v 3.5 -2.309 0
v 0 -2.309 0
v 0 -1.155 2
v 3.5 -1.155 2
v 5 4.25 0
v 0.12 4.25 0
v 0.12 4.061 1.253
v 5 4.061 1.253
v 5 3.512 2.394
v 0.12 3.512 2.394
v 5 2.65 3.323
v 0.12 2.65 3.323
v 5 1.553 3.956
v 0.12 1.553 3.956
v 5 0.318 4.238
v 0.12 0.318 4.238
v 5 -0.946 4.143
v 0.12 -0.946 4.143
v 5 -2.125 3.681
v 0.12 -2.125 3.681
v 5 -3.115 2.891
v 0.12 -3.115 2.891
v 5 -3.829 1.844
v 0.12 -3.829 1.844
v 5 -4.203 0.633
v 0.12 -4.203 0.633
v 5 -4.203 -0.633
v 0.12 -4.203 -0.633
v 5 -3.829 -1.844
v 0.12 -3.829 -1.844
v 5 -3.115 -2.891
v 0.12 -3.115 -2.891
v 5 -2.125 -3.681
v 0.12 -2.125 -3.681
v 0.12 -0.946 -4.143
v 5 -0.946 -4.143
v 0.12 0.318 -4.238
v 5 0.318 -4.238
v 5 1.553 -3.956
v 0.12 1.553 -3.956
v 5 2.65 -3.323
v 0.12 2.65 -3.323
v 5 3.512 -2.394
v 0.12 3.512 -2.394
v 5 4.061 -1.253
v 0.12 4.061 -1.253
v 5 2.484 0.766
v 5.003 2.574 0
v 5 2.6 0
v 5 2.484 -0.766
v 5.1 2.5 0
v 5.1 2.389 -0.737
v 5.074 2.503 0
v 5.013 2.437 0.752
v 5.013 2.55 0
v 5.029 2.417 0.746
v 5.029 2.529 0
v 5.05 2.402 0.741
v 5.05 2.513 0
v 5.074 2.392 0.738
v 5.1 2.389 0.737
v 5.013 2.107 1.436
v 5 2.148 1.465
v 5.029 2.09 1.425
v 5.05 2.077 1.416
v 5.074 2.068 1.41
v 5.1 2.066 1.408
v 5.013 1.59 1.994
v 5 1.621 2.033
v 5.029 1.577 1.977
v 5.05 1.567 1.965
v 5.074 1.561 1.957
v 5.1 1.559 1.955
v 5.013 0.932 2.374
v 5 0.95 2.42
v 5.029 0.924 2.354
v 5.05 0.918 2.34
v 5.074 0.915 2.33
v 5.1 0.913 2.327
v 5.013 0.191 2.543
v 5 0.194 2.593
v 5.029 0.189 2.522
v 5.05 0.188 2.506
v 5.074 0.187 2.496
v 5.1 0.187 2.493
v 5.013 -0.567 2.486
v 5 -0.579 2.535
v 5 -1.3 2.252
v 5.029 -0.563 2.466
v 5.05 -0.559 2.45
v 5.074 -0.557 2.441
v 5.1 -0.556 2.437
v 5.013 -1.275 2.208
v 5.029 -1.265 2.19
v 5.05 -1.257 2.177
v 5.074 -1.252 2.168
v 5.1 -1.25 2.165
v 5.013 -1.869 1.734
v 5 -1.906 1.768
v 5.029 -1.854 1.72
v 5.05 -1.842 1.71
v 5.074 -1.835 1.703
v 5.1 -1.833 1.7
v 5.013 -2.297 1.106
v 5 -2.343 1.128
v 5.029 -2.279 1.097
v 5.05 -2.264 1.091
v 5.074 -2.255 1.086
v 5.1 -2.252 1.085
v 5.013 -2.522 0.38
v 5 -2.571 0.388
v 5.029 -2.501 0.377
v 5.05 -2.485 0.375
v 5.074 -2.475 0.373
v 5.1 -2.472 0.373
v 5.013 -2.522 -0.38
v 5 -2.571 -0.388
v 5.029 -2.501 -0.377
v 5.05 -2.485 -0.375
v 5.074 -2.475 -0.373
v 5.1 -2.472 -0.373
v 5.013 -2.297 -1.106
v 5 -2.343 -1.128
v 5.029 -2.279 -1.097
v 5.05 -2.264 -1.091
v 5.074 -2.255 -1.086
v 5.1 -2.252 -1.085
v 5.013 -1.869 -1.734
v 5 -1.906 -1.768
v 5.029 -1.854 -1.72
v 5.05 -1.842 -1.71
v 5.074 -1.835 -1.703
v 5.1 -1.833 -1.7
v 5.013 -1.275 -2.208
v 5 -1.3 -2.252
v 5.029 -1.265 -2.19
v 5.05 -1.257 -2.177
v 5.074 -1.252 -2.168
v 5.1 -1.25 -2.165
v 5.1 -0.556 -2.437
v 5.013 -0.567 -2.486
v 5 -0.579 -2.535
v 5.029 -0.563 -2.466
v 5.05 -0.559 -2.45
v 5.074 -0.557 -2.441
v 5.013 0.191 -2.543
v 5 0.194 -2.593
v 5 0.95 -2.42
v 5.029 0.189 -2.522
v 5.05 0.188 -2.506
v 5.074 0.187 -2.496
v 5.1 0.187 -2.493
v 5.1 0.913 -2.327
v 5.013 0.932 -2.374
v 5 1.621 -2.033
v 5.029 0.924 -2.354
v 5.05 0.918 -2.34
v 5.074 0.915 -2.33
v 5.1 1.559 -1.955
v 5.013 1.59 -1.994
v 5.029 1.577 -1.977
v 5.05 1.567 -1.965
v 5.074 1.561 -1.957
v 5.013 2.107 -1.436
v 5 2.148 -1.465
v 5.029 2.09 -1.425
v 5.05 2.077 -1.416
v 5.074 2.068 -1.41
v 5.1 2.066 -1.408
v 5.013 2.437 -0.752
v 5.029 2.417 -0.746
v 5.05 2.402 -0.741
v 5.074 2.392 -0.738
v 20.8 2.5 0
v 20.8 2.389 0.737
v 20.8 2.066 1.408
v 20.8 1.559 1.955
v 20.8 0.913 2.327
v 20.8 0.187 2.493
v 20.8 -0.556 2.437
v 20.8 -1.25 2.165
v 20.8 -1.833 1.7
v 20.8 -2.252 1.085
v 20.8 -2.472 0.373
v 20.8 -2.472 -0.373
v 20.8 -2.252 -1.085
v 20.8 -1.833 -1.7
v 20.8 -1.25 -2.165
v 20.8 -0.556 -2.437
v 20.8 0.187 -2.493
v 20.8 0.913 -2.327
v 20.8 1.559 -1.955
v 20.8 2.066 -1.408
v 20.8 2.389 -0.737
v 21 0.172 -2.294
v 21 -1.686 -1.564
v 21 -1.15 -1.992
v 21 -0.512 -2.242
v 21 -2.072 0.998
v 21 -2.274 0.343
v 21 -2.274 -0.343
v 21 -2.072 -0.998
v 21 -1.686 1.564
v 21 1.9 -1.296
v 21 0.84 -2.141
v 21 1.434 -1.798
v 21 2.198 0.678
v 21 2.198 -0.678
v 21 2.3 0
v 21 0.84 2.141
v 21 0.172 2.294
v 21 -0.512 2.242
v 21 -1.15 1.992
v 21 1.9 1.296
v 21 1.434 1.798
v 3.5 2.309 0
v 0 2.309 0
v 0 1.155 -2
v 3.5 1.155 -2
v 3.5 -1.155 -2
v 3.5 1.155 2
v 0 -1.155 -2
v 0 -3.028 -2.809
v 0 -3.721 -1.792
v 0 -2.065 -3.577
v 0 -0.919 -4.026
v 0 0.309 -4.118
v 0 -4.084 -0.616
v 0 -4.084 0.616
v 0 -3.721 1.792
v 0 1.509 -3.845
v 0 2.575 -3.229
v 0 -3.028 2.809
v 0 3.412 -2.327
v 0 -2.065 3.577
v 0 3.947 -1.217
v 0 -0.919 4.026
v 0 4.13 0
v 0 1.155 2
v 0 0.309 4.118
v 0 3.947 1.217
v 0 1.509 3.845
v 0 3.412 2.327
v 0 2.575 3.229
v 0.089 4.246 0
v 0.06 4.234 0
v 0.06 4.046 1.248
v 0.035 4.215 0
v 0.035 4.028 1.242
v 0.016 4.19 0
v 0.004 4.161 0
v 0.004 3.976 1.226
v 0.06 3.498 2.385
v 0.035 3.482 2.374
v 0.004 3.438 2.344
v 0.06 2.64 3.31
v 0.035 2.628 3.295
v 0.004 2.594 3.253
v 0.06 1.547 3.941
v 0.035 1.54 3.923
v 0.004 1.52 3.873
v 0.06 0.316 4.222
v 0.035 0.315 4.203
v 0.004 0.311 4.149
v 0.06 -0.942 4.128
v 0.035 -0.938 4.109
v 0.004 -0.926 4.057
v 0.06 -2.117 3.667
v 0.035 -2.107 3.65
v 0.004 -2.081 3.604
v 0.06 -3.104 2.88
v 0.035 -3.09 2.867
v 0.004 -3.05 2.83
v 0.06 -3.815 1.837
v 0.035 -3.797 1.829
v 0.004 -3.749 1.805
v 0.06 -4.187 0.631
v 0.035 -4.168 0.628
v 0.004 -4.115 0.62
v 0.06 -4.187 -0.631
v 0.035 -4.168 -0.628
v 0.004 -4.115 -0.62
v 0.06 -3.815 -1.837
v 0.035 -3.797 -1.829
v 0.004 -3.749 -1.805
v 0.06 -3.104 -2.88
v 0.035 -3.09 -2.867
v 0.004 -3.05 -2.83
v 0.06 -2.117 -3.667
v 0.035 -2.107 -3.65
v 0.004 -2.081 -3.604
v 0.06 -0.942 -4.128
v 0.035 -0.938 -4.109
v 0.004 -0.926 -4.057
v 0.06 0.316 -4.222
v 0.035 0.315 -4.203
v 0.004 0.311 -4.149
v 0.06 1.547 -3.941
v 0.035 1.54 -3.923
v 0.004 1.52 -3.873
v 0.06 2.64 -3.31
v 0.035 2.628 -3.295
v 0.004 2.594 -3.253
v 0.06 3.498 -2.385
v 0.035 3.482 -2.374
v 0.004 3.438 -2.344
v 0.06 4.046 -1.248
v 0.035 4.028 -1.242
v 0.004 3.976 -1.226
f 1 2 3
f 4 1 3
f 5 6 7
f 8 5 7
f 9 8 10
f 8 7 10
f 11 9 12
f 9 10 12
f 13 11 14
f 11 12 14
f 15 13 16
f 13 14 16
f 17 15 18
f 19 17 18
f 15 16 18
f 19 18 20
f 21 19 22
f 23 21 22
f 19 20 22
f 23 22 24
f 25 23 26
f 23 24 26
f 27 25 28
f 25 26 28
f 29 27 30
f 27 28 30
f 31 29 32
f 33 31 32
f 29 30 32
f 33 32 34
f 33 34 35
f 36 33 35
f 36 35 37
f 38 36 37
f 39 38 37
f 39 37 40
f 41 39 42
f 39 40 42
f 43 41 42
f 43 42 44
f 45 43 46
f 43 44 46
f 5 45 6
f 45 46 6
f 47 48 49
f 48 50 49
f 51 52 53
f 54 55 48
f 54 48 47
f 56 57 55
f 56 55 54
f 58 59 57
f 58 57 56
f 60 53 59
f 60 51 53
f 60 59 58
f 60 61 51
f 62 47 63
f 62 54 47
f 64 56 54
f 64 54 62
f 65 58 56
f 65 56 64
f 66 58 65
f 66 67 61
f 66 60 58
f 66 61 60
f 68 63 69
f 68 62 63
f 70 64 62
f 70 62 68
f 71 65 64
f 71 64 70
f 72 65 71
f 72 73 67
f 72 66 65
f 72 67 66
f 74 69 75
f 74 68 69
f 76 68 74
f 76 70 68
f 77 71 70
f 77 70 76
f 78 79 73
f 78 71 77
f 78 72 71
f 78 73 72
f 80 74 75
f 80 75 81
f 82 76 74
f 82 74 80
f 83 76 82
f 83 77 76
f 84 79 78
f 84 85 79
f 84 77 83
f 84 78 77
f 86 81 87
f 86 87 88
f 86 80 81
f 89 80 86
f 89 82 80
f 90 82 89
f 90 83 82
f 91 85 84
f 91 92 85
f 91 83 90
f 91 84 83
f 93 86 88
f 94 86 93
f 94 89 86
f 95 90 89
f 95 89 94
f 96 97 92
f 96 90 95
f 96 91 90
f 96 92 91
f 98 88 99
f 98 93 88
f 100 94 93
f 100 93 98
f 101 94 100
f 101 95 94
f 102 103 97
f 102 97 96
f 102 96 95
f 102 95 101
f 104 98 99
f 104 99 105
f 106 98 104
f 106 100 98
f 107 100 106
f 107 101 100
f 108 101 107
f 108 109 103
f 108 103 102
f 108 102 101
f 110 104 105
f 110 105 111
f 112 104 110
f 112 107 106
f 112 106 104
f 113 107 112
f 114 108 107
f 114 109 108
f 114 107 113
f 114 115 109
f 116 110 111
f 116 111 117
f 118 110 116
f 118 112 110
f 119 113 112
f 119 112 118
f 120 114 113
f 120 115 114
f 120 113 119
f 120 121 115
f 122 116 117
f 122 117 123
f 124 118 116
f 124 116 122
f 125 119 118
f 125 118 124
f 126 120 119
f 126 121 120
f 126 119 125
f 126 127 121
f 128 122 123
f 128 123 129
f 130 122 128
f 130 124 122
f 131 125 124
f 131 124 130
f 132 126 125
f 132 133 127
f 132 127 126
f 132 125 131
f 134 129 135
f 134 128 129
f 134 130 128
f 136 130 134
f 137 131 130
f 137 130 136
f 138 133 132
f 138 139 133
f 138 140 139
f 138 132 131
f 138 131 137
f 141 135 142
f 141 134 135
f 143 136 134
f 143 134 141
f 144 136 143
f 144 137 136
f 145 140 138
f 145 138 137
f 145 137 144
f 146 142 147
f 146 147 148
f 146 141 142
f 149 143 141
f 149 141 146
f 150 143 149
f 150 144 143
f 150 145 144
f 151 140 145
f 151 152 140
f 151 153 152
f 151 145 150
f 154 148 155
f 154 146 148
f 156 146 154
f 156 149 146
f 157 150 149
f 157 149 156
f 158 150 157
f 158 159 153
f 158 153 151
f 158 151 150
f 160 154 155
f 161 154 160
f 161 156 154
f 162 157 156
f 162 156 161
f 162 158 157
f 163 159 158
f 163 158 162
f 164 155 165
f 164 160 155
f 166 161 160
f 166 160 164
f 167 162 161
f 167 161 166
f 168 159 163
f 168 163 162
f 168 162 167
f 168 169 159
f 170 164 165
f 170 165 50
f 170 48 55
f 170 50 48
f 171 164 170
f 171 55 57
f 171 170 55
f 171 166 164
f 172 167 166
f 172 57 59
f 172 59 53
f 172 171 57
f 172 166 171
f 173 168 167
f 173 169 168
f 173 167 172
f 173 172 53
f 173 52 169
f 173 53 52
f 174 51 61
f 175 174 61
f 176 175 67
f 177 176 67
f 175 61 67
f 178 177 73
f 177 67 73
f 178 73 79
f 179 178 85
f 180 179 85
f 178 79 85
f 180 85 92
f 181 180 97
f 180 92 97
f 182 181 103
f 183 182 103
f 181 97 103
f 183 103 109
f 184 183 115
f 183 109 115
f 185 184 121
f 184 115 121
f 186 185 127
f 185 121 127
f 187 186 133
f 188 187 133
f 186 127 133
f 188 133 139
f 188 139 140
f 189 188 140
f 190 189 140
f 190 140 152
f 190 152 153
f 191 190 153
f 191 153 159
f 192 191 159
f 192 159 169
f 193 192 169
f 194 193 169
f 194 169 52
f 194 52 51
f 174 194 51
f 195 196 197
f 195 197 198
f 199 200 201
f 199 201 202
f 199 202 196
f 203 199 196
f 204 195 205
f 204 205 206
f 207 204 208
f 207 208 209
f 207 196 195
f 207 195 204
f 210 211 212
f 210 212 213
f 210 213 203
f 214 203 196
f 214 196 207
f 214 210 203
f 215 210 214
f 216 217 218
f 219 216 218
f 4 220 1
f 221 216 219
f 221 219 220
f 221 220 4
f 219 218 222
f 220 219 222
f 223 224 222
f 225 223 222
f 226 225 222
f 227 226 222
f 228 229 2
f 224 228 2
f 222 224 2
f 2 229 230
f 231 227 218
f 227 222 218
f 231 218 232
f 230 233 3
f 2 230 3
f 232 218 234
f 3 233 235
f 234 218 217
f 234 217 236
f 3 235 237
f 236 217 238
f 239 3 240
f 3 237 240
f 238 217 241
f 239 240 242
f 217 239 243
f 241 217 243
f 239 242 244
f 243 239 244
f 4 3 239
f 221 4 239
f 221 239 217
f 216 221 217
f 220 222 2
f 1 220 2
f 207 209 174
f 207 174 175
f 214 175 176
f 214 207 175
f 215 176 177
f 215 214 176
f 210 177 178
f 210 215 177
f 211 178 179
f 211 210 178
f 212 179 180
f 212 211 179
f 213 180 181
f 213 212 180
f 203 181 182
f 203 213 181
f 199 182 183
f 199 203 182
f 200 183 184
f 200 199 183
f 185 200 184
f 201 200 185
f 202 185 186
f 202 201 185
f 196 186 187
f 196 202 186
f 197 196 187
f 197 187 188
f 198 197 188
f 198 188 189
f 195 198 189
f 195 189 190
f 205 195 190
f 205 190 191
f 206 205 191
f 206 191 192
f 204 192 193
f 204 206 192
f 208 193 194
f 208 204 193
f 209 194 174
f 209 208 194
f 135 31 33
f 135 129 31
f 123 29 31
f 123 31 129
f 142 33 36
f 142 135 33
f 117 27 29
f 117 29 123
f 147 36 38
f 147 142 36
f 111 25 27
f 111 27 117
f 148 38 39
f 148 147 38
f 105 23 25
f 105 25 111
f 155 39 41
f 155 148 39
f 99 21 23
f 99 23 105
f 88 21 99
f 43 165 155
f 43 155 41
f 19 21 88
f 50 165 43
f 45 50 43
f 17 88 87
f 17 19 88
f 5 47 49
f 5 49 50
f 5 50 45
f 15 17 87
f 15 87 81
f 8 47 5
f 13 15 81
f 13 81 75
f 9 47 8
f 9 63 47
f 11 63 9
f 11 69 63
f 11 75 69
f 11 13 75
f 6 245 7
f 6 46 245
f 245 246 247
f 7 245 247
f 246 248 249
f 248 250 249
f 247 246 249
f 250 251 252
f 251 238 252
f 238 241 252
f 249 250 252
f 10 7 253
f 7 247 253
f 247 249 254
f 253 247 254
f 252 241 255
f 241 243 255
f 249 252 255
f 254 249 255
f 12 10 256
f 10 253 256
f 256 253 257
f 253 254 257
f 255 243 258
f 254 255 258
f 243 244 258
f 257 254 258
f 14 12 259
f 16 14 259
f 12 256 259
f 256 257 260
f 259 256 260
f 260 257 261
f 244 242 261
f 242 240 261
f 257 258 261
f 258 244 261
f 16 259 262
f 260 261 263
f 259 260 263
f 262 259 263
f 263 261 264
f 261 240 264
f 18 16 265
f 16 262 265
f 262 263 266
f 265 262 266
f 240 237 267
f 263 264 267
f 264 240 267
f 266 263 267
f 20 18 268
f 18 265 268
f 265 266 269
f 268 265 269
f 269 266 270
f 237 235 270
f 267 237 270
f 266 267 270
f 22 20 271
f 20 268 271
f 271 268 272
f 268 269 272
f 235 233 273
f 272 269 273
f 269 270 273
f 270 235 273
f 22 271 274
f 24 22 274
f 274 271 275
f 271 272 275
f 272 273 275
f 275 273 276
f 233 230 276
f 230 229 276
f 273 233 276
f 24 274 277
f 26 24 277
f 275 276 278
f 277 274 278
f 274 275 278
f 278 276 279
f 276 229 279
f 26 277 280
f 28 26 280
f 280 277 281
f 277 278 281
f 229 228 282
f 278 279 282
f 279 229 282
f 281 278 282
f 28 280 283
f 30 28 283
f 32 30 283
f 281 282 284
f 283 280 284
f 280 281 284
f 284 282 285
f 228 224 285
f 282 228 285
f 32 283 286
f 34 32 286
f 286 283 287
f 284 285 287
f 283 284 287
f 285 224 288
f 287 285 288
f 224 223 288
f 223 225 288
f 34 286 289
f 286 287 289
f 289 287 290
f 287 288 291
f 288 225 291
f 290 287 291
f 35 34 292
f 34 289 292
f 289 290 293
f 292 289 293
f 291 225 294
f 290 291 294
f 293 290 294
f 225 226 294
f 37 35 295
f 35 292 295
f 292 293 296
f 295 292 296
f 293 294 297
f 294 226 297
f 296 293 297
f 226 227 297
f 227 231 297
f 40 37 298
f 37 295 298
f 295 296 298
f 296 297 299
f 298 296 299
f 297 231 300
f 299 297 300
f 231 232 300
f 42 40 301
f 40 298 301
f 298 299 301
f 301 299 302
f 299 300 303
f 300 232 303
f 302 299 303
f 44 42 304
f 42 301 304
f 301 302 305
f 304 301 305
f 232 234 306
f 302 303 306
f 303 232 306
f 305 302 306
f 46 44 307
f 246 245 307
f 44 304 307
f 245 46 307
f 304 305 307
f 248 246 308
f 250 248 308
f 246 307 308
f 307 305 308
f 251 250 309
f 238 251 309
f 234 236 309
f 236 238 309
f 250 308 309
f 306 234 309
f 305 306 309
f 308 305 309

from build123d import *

# Parameters (mm, degrees)
REVOLVE1_OUTLINE_R     = 2.5
REVOLVE1_DEPTH         = 21
REVOLVE1_2_OUTLINE_R   = 4.25
REVOLVE1_2_OUTLINE_R_2 = 2.5
REVOLVE1_2_DEPTH       = 5
FILLET1_R              = 0.1
FILLET2_R              = 0.12
CHAMFER1_SIZE          = 0.2
EXTRUDE1_DEPTH         = 3.5


# Read off the part's stored shape, not the designer's step: Revolve1
with BuildPart() as part:
    # Revolve1 outline → Revolve1 (new body)
    with BuildSketch(Plane.YZ):
        Circle(REVOLVE1_OUTLINE_R)
    extrude(amount=REVOLVE1_DEPTH)

    # Revolve1 2 outline → Revolve1 2 (add)
    with BuildSketch(Plane.YZ):
        Circle(REVOLVE1_2_OUTLINE_R)
        Circle(REVOLVE1_2_OUTLINE_R_2, mode=Mode.SUBTRACT)
    extrude(amount=REVOLVE1_2_DEPTH)

    # Fillet1
    fillet1_edges = [part.edges().sort_by_distance(p)[0] for p in [
        (5, -2.5, 0),
    ]]
    fillet(fillet1_edges, radius=FILLET1_R)

    # Fillet2
    fillet2_edges = [part.edges().sort_by_distance(p)[0] for p in [
        (0, -4.25, 0),
    ]]
    fillet(fillet2_edges, radius=FILLET2_R)

    # Chamfer1
    chamfer1_edges = [part.edges().sort_by_distance(p)[0] for p in [
        (21, -2.5, 0),
    ]]
    chamfer(chamfer1_edges, length=CHAMFER1_SIZE)

    # Sketch2 → Extrude1 (cut)
    with BuildSketch(Plane.ZY):
        Polygon((0, 2.309401077), (-2, 1.154700538), (-2, -1.154700538), (0, -2.309401077), (2, -1.154700538), (2, 1.154700538), align=None)
    extrude(amount=-EXTRUDE1_DEPTH, mode=Mode.SUBTRACT)


solid = part.part
